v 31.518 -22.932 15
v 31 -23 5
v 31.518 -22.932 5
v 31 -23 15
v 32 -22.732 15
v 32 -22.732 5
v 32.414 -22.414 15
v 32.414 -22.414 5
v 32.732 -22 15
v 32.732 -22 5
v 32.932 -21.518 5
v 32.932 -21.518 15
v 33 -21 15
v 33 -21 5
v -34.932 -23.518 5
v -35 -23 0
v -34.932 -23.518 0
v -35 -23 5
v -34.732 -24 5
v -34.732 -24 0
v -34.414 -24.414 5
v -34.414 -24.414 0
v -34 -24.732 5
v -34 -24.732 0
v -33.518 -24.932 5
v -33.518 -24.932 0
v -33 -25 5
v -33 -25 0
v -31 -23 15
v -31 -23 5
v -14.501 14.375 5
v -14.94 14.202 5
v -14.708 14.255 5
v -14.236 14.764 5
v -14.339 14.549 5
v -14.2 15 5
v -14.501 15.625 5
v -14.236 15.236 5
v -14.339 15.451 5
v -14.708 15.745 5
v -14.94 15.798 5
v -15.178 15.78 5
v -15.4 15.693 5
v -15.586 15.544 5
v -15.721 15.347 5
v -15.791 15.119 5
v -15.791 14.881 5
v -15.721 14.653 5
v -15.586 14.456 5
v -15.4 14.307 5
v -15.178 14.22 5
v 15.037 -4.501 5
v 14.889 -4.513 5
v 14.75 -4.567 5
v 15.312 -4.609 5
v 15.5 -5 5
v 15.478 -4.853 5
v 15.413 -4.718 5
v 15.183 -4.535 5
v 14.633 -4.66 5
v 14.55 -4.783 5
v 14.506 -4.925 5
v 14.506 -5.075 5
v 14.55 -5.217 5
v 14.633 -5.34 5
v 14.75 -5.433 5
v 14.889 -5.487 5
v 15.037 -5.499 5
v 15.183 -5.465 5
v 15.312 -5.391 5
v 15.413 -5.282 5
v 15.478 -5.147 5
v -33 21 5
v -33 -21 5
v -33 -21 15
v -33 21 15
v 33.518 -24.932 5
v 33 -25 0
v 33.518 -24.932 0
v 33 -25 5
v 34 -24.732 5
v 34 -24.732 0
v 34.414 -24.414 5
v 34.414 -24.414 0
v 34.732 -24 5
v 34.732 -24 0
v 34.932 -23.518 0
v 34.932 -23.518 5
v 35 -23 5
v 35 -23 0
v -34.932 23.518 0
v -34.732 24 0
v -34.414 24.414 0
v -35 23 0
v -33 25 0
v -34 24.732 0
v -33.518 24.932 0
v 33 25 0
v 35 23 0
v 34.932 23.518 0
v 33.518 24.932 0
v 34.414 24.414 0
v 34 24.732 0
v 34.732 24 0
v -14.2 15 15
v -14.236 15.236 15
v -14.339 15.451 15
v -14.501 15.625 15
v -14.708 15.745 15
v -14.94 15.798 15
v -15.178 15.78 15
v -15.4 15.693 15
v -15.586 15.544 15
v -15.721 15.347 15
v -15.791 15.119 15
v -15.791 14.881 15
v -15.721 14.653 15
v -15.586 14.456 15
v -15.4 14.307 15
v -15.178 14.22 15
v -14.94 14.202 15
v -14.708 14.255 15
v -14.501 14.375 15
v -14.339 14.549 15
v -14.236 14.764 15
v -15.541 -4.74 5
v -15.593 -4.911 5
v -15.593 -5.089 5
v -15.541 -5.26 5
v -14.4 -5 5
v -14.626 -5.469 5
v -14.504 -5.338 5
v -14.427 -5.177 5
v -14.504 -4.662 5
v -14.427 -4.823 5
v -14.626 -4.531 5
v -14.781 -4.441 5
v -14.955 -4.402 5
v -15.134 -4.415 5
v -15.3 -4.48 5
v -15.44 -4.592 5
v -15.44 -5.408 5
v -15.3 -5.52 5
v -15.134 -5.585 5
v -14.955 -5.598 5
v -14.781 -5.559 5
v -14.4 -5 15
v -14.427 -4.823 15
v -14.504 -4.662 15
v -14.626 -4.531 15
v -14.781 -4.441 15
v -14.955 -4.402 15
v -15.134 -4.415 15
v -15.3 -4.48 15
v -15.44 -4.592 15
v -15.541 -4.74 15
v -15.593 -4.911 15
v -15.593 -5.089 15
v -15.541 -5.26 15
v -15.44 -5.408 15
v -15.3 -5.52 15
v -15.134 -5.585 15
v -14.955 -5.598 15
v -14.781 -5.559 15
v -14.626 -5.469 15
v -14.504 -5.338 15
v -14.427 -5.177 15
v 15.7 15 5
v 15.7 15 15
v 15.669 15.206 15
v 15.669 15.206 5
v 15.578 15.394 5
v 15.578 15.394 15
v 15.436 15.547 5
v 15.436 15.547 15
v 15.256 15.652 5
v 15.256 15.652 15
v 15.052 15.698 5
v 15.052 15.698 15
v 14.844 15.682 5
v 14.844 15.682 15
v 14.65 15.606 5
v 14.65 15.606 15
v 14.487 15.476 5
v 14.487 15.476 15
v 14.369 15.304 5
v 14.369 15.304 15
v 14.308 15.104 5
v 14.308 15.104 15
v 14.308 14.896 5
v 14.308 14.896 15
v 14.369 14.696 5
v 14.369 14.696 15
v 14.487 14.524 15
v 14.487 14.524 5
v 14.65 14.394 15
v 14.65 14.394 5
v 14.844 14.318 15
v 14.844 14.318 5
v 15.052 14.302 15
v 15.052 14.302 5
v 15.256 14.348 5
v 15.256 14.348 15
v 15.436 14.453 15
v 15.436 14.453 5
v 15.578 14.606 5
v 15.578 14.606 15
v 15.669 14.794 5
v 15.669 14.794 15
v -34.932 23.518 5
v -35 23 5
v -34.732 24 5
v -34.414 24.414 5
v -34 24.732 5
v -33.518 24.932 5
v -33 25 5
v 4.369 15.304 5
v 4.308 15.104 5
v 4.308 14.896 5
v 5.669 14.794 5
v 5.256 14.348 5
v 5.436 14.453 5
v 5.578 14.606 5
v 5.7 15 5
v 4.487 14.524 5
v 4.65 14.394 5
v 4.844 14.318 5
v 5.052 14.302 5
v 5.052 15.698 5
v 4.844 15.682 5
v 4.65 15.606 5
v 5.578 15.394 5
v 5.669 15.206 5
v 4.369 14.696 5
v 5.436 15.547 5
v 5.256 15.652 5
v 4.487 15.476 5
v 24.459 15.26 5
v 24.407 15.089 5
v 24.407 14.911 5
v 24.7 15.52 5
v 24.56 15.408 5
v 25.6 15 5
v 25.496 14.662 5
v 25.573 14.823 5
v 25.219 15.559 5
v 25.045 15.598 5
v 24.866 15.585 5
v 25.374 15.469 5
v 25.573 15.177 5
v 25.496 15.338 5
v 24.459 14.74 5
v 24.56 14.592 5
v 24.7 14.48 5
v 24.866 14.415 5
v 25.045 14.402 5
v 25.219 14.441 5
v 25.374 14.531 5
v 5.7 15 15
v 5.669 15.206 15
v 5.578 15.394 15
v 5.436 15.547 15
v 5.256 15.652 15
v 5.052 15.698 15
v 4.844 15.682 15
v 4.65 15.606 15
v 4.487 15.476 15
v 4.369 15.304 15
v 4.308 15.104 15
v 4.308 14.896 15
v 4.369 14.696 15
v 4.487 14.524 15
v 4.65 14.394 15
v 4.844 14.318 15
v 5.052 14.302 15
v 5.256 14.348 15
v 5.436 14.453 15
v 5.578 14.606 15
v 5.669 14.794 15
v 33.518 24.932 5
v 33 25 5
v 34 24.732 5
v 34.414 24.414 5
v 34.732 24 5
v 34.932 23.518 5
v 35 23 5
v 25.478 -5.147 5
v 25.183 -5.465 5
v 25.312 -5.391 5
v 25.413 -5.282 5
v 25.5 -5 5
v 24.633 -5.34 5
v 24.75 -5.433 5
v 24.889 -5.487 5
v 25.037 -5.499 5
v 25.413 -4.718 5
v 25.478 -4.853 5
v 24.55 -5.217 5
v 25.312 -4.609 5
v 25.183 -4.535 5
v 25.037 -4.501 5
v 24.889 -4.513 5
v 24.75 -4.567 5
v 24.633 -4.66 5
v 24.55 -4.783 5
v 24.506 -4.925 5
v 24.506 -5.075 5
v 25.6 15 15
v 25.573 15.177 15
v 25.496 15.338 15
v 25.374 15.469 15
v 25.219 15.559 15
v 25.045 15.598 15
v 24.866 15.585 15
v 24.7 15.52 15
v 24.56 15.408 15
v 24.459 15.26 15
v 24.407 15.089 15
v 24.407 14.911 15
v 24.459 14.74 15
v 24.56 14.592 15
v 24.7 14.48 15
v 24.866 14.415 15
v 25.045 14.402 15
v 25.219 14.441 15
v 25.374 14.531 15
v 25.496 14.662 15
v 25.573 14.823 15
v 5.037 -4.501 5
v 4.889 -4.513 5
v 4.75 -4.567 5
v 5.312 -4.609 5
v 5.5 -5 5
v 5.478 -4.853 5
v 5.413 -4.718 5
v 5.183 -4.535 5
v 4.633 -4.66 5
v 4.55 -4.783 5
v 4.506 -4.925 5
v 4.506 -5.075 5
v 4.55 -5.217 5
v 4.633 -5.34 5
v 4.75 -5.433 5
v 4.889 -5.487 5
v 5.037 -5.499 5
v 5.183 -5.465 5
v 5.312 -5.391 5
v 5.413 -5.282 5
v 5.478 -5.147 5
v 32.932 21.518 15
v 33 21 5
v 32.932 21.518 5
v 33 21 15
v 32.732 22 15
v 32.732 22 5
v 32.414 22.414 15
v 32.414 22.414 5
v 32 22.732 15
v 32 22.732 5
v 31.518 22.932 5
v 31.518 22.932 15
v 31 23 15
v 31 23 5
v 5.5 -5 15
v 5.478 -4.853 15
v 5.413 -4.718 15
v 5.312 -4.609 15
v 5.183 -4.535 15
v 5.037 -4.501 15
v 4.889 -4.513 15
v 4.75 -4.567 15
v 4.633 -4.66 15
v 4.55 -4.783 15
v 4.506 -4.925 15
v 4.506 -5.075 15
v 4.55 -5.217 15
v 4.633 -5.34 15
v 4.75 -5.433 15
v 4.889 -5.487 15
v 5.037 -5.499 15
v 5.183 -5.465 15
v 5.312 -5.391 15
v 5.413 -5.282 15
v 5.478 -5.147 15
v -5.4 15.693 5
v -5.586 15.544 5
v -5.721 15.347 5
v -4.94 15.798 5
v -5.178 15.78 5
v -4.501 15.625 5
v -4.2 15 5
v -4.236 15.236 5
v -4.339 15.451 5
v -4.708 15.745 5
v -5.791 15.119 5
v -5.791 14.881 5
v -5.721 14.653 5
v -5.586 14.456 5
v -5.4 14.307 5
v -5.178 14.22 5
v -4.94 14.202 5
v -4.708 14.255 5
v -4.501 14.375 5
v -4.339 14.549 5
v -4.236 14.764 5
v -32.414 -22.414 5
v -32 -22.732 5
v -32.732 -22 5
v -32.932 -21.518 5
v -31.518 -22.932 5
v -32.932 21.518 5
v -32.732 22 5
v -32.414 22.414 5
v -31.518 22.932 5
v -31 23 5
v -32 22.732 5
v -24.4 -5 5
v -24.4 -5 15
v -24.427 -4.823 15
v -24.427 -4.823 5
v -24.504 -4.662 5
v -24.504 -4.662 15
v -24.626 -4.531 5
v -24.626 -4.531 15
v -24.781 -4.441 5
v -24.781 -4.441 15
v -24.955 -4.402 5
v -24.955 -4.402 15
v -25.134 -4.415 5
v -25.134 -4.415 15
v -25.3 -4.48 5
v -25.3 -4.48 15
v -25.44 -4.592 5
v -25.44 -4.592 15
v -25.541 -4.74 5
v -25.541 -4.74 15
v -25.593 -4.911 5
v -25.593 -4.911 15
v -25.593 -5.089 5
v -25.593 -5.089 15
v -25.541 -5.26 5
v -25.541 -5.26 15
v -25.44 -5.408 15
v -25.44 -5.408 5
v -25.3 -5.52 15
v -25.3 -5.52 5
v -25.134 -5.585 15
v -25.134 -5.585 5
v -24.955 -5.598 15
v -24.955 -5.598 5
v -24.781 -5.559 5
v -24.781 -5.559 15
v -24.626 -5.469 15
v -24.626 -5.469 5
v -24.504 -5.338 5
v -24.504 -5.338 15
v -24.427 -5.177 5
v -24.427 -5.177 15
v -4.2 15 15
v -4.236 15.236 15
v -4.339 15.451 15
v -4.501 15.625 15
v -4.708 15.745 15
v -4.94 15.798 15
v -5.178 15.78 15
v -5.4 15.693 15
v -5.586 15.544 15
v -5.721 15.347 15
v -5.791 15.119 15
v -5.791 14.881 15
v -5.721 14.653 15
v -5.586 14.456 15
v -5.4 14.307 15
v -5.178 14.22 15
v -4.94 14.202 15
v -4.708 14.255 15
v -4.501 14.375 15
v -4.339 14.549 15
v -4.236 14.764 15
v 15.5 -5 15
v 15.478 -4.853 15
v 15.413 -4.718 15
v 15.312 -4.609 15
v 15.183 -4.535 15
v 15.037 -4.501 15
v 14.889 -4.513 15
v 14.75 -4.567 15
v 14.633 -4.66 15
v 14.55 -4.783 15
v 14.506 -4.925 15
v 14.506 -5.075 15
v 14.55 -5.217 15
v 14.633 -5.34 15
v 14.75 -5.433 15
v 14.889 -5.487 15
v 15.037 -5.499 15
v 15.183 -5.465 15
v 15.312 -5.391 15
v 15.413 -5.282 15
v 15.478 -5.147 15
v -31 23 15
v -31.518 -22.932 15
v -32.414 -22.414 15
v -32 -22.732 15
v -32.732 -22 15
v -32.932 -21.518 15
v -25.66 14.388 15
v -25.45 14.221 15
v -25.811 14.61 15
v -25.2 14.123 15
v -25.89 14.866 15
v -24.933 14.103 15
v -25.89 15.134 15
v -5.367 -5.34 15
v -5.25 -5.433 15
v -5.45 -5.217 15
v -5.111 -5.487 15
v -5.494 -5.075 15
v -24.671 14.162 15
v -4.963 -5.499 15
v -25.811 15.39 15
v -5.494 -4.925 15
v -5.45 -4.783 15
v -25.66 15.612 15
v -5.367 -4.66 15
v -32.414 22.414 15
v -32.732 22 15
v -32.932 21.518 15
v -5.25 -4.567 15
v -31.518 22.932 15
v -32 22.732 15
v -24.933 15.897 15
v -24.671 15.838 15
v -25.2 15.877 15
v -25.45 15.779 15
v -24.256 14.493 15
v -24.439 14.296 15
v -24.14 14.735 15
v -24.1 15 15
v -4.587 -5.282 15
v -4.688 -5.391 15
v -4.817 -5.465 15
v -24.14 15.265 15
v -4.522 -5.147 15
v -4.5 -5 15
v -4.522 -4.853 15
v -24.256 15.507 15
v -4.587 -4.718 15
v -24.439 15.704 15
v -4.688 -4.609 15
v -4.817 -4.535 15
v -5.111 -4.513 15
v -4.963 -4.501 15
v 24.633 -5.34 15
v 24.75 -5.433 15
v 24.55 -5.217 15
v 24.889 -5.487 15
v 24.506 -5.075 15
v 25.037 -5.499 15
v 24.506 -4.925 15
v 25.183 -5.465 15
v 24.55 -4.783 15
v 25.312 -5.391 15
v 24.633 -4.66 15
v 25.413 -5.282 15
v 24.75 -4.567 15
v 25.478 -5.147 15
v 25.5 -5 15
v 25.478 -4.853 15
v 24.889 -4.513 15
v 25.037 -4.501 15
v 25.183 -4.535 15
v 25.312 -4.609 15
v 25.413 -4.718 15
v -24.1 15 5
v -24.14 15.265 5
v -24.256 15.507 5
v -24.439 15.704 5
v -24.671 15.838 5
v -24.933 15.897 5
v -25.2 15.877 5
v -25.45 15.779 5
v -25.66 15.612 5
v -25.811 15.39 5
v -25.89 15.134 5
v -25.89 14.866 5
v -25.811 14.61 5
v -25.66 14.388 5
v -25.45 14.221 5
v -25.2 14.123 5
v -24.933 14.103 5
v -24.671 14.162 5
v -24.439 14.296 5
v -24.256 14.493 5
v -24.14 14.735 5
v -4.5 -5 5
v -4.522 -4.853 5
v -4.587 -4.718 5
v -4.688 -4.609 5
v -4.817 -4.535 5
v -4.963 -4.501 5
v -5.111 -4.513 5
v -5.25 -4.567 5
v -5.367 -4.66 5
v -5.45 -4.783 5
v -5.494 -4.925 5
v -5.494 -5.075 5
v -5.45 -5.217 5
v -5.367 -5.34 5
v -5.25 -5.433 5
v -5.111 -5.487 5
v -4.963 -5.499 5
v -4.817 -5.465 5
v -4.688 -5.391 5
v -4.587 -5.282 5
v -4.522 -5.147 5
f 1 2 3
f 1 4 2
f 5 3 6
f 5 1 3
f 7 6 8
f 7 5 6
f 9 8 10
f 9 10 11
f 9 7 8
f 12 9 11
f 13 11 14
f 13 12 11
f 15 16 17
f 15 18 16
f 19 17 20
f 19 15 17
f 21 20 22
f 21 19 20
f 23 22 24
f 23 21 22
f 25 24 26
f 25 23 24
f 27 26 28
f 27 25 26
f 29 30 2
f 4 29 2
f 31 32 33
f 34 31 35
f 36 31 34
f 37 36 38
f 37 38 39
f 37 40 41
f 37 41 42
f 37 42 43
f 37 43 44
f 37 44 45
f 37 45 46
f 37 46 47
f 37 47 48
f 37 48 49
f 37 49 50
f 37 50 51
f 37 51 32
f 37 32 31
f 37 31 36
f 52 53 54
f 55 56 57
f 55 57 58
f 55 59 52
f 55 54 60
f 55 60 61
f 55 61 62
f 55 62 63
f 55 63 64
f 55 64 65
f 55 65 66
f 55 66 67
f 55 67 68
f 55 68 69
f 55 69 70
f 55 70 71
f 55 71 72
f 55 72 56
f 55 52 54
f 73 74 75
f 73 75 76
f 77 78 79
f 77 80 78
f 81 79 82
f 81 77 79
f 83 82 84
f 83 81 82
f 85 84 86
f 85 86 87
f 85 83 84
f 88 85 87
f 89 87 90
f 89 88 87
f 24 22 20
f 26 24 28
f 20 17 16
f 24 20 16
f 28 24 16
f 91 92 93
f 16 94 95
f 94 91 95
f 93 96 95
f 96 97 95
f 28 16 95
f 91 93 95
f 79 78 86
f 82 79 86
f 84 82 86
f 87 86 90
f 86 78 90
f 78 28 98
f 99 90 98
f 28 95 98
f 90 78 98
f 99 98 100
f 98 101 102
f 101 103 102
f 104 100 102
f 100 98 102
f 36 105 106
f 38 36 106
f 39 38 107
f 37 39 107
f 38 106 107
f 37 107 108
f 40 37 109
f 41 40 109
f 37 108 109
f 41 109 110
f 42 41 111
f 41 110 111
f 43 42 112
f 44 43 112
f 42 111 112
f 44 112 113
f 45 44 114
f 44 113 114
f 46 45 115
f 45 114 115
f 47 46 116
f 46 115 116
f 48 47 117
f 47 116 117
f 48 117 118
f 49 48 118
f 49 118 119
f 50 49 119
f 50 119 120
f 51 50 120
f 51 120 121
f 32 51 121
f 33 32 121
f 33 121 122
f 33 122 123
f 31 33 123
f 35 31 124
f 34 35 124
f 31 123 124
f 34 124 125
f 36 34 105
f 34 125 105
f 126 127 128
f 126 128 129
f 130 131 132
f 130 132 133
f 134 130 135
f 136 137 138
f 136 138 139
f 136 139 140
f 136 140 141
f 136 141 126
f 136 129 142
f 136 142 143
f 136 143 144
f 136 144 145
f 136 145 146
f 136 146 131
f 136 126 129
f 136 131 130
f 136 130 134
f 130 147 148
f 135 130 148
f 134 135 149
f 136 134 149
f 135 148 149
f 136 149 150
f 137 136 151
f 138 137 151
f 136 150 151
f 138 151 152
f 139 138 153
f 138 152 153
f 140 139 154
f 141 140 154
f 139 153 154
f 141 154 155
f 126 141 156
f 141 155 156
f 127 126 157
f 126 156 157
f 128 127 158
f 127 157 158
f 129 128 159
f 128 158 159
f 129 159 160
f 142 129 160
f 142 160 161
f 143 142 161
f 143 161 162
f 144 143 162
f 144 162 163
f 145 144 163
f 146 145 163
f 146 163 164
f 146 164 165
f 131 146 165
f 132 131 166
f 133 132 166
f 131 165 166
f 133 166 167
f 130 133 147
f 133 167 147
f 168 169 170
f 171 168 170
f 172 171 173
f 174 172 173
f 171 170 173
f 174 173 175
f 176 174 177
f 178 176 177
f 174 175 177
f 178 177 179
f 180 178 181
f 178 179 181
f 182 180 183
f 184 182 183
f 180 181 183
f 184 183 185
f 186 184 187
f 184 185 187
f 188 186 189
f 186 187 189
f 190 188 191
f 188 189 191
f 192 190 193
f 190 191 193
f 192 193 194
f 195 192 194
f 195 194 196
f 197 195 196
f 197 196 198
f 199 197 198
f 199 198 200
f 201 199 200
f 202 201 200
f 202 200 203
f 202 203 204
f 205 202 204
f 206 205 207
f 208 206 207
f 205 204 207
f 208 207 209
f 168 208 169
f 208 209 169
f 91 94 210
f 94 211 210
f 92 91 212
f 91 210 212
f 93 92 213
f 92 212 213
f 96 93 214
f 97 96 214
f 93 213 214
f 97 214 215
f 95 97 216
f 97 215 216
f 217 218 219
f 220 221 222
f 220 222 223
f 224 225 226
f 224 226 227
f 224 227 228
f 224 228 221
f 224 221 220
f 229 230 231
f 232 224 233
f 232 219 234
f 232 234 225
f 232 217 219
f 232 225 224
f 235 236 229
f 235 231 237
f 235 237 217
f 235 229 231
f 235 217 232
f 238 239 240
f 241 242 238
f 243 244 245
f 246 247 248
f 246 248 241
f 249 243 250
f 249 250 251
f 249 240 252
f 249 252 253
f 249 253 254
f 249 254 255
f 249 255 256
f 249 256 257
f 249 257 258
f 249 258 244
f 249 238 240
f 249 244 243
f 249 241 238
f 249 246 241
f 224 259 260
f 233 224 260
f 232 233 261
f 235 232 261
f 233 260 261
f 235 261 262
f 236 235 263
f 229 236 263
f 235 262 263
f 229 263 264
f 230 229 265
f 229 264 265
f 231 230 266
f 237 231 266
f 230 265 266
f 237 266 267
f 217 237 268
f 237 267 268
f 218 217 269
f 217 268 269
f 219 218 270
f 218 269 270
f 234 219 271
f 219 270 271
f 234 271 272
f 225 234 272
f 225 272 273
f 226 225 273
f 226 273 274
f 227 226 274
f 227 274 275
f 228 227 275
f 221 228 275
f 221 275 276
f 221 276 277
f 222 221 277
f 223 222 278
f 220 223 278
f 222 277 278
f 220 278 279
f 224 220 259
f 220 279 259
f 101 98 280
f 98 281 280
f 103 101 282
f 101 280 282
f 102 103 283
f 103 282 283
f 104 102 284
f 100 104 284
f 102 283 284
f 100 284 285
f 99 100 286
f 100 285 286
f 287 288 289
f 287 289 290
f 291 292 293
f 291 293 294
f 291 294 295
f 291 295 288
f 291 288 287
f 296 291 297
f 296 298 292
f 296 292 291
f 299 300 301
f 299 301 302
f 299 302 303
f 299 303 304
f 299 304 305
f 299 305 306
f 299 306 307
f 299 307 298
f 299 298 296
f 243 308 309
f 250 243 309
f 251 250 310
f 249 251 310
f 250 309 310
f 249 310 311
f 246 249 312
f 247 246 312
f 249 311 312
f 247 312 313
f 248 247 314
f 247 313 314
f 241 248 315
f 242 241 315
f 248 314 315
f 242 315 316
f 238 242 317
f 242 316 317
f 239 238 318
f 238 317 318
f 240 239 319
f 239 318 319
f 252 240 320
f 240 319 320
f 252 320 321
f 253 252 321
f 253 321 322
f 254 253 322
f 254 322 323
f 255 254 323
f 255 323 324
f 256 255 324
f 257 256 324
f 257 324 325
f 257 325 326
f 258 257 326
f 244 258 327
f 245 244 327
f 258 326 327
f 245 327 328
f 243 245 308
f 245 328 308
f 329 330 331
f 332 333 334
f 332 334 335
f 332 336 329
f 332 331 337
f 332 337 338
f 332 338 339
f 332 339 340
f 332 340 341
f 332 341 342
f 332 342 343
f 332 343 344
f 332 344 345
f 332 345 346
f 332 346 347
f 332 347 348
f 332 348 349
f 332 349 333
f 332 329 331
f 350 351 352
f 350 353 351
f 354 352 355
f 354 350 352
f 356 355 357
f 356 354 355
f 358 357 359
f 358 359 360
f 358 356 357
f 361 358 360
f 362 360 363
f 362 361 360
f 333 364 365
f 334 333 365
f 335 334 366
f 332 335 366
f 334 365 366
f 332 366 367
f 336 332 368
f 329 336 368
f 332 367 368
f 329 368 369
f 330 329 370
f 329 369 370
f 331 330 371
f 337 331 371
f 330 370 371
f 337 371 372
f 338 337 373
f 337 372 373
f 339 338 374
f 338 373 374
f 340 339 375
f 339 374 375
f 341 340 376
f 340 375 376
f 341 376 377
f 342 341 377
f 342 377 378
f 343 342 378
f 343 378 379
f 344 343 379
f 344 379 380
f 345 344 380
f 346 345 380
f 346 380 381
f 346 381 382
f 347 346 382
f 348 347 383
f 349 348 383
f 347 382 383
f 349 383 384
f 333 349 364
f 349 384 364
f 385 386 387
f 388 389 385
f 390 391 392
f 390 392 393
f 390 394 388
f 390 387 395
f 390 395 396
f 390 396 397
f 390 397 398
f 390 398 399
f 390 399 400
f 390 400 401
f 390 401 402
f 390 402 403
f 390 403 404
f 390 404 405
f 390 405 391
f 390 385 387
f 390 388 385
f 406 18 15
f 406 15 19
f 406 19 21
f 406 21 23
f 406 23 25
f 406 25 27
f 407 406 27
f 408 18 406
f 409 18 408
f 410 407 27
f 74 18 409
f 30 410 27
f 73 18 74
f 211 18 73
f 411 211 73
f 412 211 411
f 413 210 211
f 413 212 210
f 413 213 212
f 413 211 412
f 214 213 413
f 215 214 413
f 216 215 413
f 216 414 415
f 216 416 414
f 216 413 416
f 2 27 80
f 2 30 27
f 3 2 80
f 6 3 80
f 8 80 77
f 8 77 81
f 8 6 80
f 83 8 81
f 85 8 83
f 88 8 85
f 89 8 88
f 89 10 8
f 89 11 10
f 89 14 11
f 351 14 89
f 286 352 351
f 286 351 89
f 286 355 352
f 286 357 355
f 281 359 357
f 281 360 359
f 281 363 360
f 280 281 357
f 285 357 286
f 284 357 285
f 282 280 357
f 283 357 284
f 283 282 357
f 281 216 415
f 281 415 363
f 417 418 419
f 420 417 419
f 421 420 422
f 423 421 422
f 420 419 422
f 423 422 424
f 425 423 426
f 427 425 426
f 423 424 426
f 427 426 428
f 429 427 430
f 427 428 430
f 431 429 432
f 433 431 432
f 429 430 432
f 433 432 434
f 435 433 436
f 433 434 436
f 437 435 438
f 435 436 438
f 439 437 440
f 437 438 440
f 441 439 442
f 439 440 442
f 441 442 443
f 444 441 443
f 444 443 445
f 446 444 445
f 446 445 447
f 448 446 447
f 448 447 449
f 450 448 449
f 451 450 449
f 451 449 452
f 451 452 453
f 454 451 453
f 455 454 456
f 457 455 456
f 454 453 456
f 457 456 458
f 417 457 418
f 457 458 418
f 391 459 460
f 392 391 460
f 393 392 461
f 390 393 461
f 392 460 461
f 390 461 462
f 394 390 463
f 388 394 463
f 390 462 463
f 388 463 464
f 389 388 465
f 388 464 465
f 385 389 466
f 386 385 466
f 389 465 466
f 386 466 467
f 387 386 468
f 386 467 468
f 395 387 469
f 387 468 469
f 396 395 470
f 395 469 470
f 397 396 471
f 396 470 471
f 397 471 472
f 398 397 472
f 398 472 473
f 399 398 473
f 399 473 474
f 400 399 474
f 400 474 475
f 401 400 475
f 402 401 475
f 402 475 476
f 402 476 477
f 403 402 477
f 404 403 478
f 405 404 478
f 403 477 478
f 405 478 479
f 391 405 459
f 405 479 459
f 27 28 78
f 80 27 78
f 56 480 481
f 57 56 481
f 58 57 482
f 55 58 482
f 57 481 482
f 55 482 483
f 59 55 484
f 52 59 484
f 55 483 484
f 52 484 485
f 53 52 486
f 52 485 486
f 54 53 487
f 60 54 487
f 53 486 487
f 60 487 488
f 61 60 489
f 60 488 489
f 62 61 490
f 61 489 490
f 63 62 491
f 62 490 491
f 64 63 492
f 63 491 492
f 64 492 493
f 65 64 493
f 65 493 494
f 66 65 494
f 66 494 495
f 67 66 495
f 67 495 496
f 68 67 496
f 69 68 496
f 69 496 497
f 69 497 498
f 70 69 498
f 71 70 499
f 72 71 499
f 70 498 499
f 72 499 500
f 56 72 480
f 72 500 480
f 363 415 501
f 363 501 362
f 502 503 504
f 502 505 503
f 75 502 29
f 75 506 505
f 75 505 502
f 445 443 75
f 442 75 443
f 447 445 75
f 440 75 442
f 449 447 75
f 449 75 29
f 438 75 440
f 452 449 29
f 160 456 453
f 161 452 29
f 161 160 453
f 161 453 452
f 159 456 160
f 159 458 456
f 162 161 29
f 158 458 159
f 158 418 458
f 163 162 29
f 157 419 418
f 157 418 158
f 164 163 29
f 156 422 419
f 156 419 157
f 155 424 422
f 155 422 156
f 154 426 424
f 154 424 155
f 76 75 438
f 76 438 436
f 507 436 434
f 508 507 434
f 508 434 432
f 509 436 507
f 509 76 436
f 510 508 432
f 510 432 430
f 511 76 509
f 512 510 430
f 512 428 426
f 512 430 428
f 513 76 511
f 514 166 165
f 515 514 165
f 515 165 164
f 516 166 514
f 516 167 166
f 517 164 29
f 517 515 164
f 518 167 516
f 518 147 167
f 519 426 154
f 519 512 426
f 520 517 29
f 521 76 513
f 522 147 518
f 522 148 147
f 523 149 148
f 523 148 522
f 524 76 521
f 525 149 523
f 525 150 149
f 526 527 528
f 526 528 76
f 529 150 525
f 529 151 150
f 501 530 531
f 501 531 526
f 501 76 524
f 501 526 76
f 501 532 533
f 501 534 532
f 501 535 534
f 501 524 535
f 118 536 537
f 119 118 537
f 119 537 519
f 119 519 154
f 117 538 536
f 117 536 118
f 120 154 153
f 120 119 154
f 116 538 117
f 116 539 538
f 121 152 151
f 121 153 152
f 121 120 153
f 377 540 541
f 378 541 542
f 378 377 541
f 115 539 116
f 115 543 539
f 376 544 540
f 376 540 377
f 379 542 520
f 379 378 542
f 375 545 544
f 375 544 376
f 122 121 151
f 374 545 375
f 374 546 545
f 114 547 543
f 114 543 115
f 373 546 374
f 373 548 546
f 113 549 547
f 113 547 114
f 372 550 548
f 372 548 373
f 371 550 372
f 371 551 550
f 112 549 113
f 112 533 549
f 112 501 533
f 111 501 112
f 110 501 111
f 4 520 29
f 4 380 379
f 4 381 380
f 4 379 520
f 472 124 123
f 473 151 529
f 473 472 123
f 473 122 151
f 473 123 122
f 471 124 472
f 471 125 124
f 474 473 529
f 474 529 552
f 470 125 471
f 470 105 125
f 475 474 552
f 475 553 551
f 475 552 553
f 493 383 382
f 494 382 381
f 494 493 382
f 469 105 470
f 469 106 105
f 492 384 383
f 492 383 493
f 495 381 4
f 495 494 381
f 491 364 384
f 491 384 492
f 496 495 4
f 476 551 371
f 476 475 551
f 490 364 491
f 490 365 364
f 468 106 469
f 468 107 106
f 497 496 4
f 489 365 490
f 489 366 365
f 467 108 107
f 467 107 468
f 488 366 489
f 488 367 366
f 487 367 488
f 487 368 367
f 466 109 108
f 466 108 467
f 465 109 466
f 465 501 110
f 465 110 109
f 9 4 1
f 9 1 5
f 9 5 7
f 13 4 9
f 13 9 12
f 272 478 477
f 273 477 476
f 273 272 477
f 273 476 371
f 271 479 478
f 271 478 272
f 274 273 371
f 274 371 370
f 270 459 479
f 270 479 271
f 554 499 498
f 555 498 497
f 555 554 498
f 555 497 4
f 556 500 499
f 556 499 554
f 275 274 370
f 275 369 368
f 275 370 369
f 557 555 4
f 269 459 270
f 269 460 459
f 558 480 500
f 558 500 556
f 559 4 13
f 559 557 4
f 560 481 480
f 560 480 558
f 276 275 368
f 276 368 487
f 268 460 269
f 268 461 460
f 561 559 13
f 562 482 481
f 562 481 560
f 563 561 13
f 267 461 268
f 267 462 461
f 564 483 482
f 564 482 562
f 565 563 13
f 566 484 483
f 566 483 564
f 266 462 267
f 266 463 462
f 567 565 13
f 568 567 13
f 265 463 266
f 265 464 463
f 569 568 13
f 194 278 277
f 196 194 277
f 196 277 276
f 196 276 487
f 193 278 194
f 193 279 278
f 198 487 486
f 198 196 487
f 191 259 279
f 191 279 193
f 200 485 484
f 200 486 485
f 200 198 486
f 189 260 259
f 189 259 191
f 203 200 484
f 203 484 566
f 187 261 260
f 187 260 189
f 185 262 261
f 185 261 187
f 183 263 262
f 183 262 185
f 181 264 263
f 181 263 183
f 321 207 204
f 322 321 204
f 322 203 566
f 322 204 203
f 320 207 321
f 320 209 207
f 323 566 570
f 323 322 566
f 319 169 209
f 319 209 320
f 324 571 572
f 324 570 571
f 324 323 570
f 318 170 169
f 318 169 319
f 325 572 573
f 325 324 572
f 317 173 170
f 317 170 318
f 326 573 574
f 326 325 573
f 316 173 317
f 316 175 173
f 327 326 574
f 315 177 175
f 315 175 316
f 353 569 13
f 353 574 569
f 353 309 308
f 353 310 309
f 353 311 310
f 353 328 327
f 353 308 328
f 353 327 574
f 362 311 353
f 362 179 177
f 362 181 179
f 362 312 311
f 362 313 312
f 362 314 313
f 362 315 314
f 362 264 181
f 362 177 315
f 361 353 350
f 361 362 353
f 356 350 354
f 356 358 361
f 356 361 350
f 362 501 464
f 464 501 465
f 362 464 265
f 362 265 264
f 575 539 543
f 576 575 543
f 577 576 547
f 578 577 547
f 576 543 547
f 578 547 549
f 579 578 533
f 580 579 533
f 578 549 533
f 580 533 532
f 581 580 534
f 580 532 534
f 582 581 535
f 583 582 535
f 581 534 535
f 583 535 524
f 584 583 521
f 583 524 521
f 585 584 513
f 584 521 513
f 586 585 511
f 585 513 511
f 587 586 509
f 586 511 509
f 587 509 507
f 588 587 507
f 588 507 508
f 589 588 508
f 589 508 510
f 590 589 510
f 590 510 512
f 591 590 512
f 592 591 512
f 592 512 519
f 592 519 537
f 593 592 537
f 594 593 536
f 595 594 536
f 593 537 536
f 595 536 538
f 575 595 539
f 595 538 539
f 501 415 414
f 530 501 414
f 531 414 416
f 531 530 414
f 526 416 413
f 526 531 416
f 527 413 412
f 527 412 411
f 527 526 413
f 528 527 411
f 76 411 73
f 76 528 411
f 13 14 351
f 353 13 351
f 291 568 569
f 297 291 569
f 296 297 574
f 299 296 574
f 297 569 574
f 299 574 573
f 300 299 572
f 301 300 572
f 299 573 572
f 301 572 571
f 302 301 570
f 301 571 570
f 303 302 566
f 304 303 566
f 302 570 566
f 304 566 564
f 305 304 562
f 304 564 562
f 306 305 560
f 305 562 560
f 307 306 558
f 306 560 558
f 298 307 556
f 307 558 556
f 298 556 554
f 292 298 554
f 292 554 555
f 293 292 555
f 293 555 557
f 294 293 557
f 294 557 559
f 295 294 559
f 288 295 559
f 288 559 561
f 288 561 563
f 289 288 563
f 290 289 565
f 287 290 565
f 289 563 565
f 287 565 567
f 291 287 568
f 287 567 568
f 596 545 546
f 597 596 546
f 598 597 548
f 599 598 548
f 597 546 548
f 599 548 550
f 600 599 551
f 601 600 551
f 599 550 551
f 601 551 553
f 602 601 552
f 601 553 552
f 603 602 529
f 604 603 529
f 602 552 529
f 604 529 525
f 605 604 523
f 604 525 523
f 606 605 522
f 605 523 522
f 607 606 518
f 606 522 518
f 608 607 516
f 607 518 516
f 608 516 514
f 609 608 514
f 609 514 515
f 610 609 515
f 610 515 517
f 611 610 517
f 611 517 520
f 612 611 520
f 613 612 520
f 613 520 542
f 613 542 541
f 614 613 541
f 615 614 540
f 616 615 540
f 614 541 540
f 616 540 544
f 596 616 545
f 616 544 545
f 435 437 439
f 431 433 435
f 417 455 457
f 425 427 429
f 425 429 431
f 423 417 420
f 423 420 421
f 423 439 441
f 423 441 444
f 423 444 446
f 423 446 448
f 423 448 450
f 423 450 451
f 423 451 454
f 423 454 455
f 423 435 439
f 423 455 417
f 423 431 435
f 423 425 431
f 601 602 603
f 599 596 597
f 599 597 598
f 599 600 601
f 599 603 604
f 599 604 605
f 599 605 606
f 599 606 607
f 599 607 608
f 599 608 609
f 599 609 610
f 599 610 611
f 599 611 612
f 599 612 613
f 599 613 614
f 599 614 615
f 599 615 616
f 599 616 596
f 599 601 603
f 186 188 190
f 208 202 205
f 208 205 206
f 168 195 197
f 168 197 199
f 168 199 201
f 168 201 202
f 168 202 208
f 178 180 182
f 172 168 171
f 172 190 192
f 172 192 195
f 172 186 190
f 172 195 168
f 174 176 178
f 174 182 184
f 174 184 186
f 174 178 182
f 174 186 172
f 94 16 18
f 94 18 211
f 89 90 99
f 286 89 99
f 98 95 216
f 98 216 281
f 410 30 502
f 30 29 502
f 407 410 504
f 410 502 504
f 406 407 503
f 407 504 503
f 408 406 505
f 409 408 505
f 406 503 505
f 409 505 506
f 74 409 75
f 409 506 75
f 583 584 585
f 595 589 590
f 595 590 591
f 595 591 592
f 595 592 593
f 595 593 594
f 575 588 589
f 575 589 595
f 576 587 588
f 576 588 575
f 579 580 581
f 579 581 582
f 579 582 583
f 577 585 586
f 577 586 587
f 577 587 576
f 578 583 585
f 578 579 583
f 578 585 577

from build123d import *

# Parameters (mm, degrees)
F0_W     = 70
F0_H     = 50
F1_DEPTH = 5
F2_W     = 66
F2_H     = 46
F3_DEPTH = 10
F4_R     = 2
F5_R     = 0.5
F5_R_2   = 0.6
F5_R_3   = 0.7
F5_R_4   = 0.8
F5_R_5   = 0.9
F6_DEPTH = 10


with BuildPart() as f1:
    # F0 (on Top) → F1 (new body)
    with BuildSketch(Plane.XY):
        Rectangle(F0_W, F0_H)
    extrude(amount=F1_DEPTH)

    # F2 (on face) → F3 (join)
    with BuildSketch(Plane.XY.offset(5)):
        Rectangle(F2_W, F2_H)
    extrude(amount=F3_DEPTH)

    # F4
    f4_edges = [f1.edges().sort_by_distance(p)[0] for p in [
        (-33, -23, 10),
        (33, -23, 10),
        (35, -25, 2.5),
        (-35, -25, 2.5),
        (-35, 25, 2.5),
        (-33, 23, 10),
        (33, 23, 10),
        (35, 25, 2.5),
    ]]
    fillet(f4_edges, radius=F4_R)

    # F5 (on face) → F6 (cut)
    with BuildSketch(Plane.XY.offset(15)):
        with Locations((25, -5)):
            Circle(F5_R)
        with Locations((15, -5)):
            Circle(F5_R)
        with Locations((5, -5)):
            Circle(F5_R)
        with Locations((-5, -5)):
            Circle(F5_R)
        with Locations((-15, -5)):
            Circle(F5_R_2)
        with Locations((-25, -5)):
            Circle(F5_R_2)
        with Locations((25, 15)):
            Circle(F5_R_2)
        with Locations((15, 15)):
            Circle(F5_R_3)
        with Locations((5, 15)):
            Circle(F5_R_3)
        with Locations((-5, 15)):
            Circle(F5_R_4)
        with Locations((-15, 15)):
            Circle(F5_R_4)
        with Locations((-25, 15)):
            Circle(F5_R_5)
    extrude(amount=-F6_DEPTH, mode=Mode.SUBTRACT)


solid = f1.part
